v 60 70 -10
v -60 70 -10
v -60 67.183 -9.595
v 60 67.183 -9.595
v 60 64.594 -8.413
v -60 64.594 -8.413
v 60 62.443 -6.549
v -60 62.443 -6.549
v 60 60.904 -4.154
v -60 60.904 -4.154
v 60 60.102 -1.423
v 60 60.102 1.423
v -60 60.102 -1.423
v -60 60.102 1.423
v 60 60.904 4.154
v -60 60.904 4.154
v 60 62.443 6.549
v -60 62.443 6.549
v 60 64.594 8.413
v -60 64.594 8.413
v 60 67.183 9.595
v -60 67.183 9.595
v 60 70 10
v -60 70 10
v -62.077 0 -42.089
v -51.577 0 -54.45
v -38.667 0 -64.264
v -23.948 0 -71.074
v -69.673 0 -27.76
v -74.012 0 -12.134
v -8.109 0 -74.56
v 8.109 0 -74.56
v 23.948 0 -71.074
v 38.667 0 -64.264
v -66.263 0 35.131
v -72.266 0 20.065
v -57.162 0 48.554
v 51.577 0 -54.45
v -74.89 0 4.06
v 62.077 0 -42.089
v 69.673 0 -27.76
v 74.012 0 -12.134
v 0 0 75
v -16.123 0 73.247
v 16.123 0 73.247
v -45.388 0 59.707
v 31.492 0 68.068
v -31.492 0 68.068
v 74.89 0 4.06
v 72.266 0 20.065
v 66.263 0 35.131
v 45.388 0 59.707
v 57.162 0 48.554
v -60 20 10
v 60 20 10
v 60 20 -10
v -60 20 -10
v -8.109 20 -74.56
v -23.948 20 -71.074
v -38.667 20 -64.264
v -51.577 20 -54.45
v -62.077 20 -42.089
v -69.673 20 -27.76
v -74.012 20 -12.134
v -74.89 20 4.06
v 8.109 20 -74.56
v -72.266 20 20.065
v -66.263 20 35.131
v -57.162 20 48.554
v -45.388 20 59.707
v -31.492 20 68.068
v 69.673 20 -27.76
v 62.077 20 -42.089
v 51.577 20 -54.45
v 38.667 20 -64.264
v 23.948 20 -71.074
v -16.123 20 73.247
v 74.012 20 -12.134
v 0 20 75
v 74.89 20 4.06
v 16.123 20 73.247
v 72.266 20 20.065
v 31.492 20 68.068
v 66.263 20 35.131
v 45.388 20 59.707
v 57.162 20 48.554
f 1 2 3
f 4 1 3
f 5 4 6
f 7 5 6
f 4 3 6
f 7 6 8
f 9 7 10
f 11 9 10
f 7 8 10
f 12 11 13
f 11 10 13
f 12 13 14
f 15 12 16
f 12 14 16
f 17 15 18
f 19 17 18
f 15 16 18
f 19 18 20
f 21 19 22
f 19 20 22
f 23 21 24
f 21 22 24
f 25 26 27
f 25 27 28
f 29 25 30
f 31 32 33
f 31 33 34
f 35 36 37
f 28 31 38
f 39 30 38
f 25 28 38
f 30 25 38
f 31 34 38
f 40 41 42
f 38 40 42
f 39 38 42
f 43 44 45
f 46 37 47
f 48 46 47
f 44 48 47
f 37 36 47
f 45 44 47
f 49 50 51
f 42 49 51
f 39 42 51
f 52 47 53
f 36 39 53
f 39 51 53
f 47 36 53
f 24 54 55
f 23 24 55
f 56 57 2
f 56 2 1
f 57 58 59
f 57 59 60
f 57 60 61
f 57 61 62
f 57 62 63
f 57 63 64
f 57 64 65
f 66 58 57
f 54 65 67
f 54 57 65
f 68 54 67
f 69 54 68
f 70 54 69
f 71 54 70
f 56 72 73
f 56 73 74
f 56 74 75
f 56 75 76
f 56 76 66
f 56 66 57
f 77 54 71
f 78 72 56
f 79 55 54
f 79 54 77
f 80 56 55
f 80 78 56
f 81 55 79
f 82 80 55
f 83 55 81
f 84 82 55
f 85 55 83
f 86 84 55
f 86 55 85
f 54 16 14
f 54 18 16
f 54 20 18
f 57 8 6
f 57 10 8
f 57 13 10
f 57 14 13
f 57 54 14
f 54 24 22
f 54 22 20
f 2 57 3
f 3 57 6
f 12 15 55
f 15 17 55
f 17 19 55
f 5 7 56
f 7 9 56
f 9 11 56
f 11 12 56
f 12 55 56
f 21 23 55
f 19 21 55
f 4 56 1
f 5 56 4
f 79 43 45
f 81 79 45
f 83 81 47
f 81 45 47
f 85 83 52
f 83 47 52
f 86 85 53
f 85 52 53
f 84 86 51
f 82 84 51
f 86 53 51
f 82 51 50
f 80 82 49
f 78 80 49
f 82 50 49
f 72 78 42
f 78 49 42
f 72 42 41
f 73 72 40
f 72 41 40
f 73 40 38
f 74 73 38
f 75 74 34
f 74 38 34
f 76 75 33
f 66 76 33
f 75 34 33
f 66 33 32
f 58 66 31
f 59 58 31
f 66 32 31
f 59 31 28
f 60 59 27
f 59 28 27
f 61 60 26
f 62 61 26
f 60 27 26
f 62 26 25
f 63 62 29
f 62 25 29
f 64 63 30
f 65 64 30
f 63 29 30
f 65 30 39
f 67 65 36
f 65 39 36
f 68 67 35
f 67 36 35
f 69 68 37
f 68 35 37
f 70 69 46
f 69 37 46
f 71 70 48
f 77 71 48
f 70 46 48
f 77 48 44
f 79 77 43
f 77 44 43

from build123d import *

# Parameters (mm, degrees)
SKIZZE1_R                       = 75
AUFSATZ_LINEAR_AUSTRAGEN1_DEPTH = 20
SKIZZE2_W                       = 120
SKIZZE2_H                       = 20
AUFSATZ_LINEAR_AUSTRAGEN2_DEPTH = 50
SKIZZE4_R                       = 10
SCHNITT_LINEAR_AUSTRAGEN2_DEPTH = 122


with BuildPart() as part:
    # Skizze1 → Aufsatz-Linear austragen1 (new body)
    with BuildSketch(Plane(origin=(0, 0, 0), x_dir=(1, 0, 0), z_dir=(0, 1, 0))):
        with Locations(Location((0, 0, 0), (0, 0, 270))):
            Circle(SKIZZE1_R)
    extrude(amount=AUFSATZ_LINEAR_AUSTRAGEN1_DEPTH)

    # Skizze2 → Aufsatz-Linear austragen2 (add)
    with BuildSketch(Plane(origin=(0, 20, 0), x_dir=(1, 0, 0), z_dir=(0, 1, 0))):
        Rectangle(SKIZZE2_W, SKIZZE2_H)
    extrude(amount=AUFSATZ_LINEAR_AUSTRAGEN2_DEPTH)

    # Skizze4 → Schnitt-Linear austragen2 (cut)
    with BuildSketch(Plane.ZY.offset(60)):
        with Locations((0, 70)):
            Circle(SKIZZE4_R)
    extrude(amount=-SCHNITT_LINEAR_AUSTRAGEN2_DEPTH, mode=Mode.SUBTRACT)


solid = part.part
